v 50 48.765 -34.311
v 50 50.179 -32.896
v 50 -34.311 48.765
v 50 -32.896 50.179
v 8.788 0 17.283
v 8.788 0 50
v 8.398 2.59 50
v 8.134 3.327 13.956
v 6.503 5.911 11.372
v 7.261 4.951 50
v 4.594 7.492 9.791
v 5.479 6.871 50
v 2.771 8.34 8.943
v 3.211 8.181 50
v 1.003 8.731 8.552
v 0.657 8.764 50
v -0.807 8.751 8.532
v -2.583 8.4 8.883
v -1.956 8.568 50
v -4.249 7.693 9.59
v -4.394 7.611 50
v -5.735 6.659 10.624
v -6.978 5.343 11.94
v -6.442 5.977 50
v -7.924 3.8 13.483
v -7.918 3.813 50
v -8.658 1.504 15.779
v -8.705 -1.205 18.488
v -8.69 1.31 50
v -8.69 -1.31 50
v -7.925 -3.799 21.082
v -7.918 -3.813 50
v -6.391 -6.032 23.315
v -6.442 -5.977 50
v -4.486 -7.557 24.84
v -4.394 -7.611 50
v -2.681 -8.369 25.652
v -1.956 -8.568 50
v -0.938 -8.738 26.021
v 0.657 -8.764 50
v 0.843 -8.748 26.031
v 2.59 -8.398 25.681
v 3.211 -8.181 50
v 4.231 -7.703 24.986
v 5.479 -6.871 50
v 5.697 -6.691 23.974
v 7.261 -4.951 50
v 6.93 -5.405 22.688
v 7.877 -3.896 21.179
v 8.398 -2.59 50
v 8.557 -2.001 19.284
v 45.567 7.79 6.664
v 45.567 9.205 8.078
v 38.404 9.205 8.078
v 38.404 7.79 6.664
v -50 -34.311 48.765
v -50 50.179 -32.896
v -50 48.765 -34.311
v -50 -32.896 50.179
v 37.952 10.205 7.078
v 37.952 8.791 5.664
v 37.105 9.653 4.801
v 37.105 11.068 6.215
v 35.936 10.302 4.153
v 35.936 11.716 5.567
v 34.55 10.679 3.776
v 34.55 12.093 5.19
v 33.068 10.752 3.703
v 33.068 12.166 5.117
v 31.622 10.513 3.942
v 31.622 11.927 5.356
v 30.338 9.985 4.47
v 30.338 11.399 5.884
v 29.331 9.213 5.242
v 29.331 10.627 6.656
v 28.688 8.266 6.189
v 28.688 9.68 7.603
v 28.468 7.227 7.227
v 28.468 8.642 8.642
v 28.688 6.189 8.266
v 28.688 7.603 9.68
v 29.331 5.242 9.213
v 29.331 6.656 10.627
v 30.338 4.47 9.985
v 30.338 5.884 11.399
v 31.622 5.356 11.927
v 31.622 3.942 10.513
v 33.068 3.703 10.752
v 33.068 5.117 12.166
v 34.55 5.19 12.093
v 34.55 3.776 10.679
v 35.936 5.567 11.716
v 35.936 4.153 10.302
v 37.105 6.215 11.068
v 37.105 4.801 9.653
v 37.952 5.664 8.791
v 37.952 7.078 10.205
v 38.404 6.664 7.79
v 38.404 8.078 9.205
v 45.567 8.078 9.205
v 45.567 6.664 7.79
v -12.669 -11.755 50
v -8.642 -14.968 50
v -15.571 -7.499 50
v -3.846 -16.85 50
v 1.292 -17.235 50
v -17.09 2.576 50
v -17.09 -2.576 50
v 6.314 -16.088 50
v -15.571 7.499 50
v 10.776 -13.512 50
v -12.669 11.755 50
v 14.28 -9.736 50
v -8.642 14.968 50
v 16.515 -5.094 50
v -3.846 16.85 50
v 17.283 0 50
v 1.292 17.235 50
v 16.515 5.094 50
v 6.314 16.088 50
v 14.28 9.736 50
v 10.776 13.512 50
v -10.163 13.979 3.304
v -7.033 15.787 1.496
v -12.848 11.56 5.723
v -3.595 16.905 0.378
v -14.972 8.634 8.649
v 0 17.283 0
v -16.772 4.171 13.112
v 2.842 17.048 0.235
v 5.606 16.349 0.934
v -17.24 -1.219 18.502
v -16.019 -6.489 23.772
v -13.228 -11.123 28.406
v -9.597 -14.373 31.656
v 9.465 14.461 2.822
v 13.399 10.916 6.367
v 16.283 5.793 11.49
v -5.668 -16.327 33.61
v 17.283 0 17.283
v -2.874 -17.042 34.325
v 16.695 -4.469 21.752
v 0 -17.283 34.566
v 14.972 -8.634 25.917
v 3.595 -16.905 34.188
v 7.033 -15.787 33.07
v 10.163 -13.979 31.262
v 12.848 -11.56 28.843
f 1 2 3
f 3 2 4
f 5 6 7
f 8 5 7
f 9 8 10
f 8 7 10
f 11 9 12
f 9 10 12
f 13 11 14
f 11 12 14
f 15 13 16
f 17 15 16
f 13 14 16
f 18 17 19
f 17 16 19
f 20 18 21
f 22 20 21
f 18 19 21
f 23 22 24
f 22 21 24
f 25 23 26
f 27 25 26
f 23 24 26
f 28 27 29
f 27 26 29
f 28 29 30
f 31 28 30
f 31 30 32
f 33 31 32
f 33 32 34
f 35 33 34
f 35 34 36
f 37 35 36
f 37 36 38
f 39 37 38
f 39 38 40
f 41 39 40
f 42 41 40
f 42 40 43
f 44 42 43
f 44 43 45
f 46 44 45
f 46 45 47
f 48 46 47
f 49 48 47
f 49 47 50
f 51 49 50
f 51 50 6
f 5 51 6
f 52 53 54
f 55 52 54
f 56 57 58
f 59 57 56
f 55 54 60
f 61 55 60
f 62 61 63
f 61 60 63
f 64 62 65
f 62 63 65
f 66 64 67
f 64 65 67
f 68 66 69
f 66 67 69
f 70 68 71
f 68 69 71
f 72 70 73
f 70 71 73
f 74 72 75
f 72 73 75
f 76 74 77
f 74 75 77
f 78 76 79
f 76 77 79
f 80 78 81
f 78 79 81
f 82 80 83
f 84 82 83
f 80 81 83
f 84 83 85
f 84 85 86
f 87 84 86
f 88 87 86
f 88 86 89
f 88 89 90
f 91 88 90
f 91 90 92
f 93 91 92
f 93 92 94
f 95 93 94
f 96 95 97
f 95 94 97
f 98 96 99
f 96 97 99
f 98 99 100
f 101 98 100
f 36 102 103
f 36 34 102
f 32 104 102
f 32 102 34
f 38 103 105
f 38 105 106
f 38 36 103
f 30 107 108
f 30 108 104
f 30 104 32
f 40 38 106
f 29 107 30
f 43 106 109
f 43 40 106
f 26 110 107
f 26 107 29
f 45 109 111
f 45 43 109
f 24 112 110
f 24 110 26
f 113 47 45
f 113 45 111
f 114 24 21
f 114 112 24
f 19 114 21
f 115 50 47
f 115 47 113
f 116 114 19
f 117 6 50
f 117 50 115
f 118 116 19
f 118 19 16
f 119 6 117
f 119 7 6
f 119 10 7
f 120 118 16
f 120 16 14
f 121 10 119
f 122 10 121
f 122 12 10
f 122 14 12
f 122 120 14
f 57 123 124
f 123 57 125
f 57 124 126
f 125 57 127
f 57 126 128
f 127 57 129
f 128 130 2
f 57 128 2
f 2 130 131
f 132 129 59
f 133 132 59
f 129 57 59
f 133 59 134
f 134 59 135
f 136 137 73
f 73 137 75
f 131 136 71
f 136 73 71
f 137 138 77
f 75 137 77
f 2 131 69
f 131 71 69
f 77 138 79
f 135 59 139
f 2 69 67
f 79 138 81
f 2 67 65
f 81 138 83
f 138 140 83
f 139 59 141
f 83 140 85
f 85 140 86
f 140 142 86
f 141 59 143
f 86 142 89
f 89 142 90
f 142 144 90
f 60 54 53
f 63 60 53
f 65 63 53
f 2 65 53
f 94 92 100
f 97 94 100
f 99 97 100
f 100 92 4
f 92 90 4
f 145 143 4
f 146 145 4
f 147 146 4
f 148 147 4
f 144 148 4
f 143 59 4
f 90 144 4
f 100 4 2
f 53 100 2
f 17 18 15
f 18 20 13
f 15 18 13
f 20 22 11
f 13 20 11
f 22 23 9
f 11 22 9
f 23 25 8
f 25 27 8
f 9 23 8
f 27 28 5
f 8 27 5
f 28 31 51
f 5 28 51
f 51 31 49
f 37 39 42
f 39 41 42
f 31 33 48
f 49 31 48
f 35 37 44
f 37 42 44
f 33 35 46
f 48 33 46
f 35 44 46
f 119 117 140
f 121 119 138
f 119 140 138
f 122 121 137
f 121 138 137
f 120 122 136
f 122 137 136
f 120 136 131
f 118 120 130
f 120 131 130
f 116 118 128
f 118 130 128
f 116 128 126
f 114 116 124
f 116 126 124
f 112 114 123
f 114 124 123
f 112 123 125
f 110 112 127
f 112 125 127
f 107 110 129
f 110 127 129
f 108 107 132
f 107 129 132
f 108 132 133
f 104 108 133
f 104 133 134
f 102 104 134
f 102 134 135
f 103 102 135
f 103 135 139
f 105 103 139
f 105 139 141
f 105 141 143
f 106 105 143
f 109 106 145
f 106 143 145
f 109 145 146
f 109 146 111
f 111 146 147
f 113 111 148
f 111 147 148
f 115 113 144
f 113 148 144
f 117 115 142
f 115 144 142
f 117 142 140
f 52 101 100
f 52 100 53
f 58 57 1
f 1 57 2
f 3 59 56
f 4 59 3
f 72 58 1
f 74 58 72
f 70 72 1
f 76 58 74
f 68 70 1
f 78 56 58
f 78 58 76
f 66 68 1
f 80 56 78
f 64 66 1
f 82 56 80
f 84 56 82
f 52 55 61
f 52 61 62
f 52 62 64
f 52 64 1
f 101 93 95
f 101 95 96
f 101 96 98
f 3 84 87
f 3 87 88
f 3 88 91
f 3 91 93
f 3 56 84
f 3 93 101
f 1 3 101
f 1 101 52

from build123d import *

# Parameters (mm, degrees)
F0_R     = 17.283022434
F1_DEPTH = 50
F2_R     = 8.7881586796
F3_DEPTH = 50
F5_DEPTH = 20
F7_W     = 100
F7_H     = 117.4868202522
F8_DEPTH = 2


with BuildPart() as f1:
    # F0 (on Top) → F1 (new body)
    with BuildSketch(Plane.XY):
        Circle(F0_R)
    extrude(amount=F1_DEPTH)

    # F2 (on face) → F3 (cut)
    with BuildSketch(Plane.XY.offset(50)):
        Circle(F2_R)
    extrude(amount=-F3_DEPTH, mode=Mode.SUBTRACT)

    # F4 (on Right) → F5 (cut, symmetric)
    with BuildSketch(Plane.YZ):
        Polygon((-17.283022434, 34.5660448679), (-17.283022434, 0), (17.283022434, 0), align=None)
    extrude(amount=F5_DEPTH, both=True, mode=Mode.SUBTRACT)

    # F7 (on offset) → F8 (join)
    with BuildSketch(Plane(origin=(0, 8.641511217, 8.641511217), x_dir=(1, 0, 0), z_dir=(0, -0.7071067812, -0.7071067812))):
        Rectangle(F7_W, F7_H)
        with BuildLine():
            ThreePointArc((38.4038900758, -0.7964591027), (28.4677323699, 0), (38.4038900758, 0.7964591027))
            Line((38.4038900758, 0.7964591027), (45.567390877, 0.7964591027))
            Line((45.567390877, 0.7964591027), (45.567390877, -0.7964591027))
            Line((45.567390877, -0.7964591027), (38.4038900758, -0.7964591027))
        make_face(mode=Mode.SUBTRACT)
    extrude(amount=F8_DEPTH)


solid = f1.part
